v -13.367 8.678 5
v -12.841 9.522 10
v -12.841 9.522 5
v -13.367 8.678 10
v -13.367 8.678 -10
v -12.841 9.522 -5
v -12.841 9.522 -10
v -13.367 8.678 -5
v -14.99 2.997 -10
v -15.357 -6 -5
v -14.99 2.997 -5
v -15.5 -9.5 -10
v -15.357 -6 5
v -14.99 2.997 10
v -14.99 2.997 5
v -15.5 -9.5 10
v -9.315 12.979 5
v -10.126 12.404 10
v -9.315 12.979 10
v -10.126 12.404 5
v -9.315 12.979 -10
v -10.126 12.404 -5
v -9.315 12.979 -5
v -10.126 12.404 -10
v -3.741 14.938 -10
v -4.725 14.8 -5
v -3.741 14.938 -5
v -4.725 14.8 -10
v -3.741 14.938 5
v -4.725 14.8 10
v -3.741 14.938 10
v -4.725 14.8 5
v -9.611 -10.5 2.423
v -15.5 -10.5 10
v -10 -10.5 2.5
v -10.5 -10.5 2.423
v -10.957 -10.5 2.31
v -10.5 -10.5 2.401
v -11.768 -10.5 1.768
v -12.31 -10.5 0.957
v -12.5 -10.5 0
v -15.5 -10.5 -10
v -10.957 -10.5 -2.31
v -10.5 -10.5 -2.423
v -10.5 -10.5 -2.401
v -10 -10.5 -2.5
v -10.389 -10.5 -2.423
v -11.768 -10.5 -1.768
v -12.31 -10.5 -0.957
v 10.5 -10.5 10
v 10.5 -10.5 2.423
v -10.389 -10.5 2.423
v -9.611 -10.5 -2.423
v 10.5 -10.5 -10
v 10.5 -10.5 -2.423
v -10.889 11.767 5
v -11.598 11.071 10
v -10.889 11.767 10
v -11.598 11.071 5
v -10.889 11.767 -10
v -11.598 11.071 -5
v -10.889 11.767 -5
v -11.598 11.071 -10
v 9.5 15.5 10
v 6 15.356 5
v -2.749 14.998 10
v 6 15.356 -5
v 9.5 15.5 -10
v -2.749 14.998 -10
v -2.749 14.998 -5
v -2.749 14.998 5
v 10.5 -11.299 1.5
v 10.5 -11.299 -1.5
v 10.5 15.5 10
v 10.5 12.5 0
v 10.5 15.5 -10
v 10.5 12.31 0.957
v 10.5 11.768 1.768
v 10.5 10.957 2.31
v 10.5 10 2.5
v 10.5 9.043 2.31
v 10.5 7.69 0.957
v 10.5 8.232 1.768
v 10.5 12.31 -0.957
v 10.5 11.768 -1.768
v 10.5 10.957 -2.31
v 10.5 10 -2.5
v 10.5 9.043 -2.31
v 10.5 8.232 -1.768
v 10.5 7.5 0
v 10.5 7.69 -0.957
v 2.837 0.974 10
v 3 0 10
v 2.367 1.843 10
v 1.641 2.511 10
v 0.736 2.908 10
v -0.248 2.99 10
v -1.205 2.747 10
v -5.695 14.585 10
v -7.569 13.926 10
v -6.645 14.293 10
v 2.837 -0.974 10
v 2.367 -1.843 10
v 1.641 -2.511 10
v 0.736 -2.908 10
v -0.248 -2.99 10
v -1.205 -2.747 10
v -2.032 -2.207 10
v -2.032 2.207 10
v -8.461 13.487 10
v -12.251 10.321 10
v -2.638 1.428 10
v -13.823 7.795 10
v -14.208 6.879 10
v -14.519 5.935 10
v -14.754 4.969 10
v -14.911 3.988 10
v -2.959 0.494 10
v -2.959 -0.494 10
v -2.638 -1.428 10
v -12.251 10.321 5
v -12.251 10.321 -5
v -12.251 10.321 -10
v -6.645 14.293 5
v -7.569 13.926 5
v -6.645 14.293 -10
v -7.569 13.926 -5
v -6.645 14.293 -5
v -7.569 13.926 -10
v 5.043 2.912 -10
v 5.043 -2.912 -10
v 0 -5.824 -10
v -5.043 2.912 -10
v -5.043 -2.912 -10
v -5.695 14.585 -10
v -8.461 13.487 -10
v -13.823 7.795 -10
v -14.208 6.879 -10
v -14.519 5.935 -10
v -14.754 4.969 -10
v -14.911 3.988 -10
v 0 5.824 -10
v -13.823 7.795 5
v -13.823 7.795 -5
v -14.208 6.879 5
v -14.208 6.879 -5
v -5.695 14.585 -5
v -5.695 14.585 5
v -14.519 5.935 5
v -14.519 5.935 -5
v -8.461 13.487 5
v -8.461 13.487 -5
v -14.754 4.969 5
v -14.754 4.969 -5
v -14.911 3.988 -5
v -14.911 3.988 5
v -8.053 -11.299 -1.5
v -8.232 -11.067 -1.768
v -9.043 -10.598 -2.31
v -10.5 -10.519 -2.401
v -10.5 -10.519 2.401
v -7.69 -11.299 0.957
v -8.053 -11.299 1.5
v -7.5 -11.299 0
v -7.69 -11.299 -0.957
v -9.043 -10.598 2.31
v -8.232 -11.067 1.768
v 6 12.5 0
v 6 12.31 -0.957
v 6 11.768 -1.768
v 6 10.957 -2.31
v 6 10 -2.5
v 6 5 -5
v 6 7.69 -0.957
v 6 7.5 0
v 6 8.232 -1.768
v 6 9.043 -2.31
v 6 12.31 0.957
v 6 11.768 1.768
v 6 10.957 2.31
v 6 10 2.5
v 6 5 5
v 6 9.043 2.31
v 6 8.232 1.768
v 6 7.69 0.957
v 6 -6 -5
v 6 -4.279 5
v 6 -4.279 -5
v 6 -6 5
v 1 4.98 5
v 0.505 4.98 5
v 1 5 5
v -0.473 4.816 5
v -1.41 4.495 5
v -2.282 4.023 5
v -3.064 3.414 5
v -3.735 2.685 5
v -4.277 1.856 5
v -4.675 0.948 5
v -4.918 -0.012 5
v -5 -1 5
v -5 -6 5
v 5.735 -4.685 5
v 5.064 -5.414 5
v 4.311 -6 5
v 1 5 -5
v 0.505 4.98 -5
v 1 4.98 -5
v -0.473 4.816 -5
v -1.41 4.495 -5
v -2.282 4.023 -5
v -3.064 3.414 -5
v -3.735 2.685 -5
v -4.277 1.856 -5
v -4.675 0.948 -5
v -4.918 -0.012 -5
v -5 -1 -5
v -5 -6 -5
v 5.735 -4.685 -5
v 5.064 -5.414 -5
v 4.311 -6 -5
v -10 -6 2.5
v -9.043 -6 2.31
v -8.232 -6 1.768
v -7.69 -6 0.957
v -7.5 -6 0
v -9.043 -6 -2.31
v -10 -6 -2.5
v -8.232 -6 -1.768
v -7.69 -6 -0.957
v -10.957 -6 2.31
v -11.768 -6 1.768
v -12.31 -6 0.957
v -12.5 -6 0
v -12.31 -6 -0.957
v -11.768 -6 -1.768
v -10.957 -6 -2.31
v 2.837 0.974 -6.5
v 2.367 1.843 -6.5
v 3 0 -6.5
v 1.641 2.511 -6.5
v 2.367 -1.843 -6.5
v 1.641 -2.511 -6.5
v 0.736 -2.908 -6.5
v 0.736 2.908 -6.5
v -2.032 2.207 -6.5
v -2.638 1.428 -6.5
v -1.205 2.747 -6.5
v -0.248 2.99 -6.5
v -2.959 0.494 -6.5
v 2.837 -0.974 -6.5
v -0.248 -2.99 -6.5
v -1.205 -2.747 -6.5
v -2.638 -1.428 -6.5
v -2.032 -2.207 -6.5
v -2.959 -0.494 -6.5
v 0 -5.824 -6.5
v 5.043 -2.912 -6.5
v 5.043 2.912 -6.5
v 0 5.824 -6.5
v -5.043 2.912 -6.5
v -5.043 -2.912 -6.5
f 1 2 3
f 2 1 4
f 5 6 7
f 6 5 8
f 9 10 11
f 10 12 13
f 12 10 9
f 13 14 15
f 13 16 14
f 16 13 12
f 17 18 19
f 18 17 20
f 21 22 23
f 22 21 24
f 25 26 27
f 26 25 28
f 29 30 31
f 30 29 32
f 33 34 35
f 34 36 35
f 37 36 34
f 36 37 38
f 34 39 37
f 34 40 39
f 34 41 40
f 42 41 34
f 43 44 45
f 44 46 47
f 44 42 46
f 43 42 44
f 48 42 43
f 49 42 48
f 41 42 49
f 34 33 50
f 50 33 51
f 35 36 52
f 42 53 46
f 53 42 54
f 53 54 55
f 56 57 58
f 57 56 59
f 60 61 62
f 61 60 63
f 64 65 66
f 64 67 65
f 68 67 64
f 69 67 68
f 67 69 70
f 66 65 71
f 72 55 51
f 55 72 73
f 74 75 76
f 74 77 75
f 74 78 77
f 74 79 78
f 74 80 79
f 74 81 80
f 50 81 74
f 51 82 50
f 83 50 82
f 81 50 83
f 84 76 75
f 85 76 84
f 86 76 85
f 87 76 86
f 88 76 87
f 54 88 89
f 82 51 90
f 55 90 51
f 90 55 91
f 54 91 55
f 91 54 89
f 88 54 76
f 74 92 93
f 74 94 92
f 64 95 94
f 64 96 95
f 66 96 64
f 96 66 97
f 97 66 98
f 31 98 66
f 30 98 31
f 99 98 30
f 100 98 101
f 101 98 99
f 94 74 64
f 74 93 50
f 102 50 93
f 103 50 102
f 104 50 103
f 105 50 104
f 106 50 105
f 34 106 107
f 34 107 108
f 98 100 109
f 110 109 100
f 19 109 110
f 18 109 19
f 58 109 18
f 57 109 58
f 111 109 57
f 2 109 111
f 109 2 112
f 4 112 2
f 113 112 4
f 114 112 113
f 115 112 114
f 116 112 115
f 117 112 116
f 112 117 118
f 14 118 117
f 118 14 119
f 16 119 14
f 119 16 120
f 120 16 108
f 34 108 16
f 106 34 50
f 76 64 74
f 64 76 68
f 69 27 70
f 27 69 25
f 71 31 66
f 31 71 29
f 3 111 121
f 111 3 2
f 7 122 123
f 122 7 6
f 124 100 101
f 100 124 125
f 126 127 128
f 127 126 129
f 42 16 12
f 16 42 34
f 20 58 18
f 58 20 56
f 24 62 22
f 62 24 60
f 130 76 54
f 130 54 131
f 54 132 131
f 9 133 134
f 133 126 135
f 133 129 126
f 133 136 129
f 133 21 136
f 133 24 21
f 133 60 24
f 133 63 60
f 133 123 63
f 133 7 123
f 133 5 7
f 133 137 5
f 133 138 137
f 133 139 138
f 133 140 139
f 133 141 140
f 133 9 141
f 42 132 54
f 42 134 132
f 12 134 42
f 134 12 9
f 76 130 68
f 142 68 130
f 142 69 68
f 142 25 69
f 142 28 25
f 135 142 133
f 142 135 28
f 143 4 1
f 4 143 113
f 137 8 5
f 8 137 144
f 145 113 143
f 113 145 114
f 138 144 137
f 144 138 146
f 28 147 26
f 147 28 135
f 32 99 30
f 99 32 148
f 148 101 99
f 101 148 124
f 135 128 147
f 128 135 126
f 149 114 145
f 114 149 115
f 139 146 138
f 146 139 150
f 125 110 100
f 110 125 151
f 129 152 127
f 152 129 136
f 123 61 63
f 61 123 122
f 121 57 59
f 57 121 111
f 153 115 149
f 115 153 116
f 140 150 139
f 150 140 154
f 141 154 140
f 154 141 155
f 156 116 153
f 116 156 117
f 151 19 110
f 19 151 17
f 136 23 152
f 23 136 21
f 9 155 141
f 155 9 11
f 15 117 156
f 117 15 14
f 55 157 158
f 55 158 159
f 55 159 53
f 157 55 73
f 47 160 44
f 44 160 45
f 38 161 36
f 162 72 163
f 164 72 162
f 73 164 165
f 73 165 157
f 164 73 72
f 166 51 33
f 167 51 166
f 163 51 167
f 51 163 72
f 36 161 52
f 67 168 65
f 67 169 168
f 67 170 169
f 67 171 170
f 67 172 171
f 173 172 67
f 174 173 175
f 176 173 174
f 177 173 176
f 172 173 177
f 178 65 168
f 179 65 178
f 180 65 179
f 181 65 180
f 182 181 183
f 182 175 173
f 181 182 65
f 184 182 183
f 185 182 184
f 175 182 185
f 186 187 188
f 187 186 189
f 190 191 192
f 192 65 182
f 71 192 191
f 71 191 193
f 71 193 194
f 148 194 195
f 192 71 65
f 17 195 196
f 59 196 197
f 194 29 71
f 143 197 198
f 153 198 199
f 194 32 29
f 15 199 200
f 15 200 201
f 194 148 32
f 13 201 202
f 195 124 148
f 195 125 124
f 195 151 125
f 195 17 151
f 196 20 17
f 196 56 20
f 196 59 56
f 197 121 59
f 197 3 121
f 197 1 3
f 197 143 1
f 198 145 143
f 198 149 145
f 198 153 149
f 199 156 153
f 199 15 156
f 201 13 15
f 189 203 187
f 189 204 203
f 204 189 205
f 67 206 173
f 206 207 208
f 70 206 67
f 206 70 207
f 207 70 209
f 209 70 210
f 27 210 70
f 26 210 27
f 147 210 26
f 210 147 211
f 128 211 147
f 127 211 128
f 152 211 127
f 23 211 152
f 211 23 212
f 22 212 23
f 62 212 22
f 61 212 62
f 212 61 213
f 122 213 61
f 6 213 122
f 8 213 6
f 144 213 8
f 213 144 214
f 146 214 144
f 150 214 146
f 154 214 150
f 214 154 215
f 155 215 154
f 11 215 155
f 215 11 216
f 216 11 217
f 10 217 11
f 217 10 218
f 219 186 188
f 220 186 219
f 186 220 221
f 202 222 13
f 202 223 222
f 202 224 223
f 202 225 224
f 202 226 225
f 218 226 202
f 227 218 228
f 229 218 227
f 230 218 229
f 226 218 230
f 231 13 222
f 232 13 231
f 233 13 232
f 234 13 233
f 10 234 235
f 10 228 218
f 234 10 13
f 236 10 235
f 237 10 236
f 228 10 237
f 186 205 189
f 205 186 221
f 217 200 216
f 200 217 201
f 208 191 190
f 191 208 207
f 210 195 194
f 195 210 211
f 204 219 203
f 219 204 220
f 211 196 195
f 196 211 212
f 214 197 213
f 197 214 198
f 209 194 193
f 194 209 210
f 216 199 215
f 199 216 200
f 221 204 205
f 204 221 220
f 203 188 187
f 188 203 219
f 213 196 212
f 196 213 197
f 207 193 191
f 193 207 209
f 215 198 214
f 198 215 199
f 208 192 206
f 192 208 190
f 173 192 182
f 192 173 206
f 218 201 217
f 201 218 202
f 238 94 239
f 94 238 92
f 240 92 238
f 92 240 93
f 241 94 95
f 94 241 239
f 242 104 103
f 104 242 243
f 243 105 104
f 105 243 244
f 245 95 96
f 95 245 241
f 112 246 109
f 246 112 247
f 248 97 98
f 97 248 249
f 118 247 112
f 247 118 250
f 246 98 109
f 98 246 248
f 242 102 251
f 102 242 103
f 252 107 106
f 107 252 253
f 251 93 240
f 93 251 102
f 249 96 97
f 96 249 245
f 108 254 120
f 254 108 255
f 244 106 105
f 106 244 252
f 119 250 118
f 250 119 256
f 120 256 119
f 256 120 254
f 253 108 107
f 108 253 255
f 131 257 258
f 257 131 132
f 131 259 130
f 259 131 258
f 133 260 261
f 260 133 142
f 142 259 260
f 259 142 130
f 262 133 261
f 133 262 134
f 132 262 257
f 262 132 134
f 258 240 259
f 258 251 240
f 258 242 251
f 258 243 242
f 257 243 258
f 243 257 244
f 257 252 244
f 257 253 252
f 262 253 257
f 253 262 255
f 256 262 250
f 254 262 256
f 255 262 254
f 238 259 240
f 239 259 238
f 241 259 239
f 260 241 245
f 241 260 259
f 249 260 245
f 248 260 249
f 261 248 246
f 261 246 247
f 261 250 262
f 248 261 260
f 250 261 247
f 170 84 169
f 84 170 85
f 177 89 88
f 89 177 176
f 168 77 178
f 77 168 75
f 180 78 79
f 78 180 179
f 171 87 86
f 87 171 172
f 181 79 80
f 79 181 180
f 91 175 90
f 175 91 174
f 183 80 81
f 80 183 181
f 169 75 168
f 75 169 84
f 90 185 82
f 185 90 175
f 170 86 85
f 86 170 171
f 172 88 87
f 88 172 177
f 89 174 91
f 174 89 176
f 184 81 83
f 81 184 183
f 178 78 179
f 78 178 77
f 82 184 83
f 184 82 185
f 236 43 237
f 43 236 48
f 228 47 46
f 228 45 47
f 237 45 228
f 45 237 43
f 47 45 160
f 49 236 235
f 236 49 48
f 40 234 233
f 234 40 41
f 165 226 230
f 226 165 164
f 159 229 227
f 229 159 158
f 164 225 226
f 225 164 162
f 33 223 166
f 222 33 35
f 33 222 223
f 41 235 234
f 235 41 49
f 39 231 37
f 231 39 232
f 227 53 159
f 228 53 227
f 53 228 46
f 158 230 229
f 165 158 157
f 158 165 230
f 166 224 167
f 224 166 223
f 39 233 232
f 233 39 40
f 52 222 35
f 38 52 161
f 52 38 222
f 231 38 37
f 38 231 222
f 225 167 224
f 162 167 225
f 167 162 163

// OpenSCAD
$fs = 1;
$fa = 1;

module lmount()
{
	difference()
	{
		union()
		{
			hull()
			{
				translate([-2.5,2.5,0])cylinder(r=12.5, h=20, center=true);
				translate([-15, -10, 0]) cube([1,1,20], center=true);
				translate([10, -10, 0]) cube([1,1,20], center=true);
				translate([10, 15, 0]) cube([1,1,20], center=true);
			}
			translate([0, -10, 0]) scale([1,0.5,1]) rotate([0, 90, 0]) cylinder(r=6/2, h=21, center=true, $fn=6);
		}
		translate([-19,19,0])
		difference()
		{
			cube([50, 50, 10], center=true);
			translate([20, -20, 0]) cylinder(r=12/2, h=11, center=true);
			translate([23, -17, 0]) cube([6,6,50], center=true);
			translate([17, -23, 0]) cube([6,6,50], center=true);
		}
		translate([0,0,0])cylinder(r=3, h=22, center=true);
		translate([0,0,-9])rotate([0,0,30])cylinder(r=10 / 2 / cos(180 / 6) + 0.05, h=5, $fn=6, center=true); 
		translate([0, 10, 0]) rotate([0, 90, 0]) cylinder(r=2.5, h=100, center=true);
		translate([-10, 0, 0]) rotate([0, 90, 90]) cylinder(r=2.5, h=100, center=true);
	}
}

module umount()
{
	difference()
	{
		union()
		{
			hull()
			{
				translate([0,0,0])cylinder(r=10, h=20, center=true);
				translate([20, 10, 0]) cube([1,1,20], center=true);
				translate([-20, 10, 0]) cube([1,1,20], center=true);
			}
			translate([0, 10.5, 0])  scale([1,0.5,1]) rotate([0, 90, 0]) cylinder(r=6/2, h=40, center=true, $fn=6);
		}

		translate([0,0,0])cylinder(r=3, h=22, center=true);
		translate([0,0,-9])rotate([0,0,0])cylinder(r=10 / 2 / cos(180 / 6) + 0.05, h=5, $fn=6, center=true); 
		translate([12.5, 0, 0]) rotate([90, 0, 0]) cylinder(r=2.5, h=100, center=true);
		translate([-12.5, 0, 0]) rotate([90, 0, 0]) cylinder(r=2.5, h=100, center=true);
		translate([12.5, -42.5, 0]) rotate([90, 0, 0]) cylinder(r=5, h=100, center=true);
		translate([-12.5, -42.5, 0]) rotate([90, 0, 0]) cylinder(r=5, h=100, center=true);

	}
}

lmount();
